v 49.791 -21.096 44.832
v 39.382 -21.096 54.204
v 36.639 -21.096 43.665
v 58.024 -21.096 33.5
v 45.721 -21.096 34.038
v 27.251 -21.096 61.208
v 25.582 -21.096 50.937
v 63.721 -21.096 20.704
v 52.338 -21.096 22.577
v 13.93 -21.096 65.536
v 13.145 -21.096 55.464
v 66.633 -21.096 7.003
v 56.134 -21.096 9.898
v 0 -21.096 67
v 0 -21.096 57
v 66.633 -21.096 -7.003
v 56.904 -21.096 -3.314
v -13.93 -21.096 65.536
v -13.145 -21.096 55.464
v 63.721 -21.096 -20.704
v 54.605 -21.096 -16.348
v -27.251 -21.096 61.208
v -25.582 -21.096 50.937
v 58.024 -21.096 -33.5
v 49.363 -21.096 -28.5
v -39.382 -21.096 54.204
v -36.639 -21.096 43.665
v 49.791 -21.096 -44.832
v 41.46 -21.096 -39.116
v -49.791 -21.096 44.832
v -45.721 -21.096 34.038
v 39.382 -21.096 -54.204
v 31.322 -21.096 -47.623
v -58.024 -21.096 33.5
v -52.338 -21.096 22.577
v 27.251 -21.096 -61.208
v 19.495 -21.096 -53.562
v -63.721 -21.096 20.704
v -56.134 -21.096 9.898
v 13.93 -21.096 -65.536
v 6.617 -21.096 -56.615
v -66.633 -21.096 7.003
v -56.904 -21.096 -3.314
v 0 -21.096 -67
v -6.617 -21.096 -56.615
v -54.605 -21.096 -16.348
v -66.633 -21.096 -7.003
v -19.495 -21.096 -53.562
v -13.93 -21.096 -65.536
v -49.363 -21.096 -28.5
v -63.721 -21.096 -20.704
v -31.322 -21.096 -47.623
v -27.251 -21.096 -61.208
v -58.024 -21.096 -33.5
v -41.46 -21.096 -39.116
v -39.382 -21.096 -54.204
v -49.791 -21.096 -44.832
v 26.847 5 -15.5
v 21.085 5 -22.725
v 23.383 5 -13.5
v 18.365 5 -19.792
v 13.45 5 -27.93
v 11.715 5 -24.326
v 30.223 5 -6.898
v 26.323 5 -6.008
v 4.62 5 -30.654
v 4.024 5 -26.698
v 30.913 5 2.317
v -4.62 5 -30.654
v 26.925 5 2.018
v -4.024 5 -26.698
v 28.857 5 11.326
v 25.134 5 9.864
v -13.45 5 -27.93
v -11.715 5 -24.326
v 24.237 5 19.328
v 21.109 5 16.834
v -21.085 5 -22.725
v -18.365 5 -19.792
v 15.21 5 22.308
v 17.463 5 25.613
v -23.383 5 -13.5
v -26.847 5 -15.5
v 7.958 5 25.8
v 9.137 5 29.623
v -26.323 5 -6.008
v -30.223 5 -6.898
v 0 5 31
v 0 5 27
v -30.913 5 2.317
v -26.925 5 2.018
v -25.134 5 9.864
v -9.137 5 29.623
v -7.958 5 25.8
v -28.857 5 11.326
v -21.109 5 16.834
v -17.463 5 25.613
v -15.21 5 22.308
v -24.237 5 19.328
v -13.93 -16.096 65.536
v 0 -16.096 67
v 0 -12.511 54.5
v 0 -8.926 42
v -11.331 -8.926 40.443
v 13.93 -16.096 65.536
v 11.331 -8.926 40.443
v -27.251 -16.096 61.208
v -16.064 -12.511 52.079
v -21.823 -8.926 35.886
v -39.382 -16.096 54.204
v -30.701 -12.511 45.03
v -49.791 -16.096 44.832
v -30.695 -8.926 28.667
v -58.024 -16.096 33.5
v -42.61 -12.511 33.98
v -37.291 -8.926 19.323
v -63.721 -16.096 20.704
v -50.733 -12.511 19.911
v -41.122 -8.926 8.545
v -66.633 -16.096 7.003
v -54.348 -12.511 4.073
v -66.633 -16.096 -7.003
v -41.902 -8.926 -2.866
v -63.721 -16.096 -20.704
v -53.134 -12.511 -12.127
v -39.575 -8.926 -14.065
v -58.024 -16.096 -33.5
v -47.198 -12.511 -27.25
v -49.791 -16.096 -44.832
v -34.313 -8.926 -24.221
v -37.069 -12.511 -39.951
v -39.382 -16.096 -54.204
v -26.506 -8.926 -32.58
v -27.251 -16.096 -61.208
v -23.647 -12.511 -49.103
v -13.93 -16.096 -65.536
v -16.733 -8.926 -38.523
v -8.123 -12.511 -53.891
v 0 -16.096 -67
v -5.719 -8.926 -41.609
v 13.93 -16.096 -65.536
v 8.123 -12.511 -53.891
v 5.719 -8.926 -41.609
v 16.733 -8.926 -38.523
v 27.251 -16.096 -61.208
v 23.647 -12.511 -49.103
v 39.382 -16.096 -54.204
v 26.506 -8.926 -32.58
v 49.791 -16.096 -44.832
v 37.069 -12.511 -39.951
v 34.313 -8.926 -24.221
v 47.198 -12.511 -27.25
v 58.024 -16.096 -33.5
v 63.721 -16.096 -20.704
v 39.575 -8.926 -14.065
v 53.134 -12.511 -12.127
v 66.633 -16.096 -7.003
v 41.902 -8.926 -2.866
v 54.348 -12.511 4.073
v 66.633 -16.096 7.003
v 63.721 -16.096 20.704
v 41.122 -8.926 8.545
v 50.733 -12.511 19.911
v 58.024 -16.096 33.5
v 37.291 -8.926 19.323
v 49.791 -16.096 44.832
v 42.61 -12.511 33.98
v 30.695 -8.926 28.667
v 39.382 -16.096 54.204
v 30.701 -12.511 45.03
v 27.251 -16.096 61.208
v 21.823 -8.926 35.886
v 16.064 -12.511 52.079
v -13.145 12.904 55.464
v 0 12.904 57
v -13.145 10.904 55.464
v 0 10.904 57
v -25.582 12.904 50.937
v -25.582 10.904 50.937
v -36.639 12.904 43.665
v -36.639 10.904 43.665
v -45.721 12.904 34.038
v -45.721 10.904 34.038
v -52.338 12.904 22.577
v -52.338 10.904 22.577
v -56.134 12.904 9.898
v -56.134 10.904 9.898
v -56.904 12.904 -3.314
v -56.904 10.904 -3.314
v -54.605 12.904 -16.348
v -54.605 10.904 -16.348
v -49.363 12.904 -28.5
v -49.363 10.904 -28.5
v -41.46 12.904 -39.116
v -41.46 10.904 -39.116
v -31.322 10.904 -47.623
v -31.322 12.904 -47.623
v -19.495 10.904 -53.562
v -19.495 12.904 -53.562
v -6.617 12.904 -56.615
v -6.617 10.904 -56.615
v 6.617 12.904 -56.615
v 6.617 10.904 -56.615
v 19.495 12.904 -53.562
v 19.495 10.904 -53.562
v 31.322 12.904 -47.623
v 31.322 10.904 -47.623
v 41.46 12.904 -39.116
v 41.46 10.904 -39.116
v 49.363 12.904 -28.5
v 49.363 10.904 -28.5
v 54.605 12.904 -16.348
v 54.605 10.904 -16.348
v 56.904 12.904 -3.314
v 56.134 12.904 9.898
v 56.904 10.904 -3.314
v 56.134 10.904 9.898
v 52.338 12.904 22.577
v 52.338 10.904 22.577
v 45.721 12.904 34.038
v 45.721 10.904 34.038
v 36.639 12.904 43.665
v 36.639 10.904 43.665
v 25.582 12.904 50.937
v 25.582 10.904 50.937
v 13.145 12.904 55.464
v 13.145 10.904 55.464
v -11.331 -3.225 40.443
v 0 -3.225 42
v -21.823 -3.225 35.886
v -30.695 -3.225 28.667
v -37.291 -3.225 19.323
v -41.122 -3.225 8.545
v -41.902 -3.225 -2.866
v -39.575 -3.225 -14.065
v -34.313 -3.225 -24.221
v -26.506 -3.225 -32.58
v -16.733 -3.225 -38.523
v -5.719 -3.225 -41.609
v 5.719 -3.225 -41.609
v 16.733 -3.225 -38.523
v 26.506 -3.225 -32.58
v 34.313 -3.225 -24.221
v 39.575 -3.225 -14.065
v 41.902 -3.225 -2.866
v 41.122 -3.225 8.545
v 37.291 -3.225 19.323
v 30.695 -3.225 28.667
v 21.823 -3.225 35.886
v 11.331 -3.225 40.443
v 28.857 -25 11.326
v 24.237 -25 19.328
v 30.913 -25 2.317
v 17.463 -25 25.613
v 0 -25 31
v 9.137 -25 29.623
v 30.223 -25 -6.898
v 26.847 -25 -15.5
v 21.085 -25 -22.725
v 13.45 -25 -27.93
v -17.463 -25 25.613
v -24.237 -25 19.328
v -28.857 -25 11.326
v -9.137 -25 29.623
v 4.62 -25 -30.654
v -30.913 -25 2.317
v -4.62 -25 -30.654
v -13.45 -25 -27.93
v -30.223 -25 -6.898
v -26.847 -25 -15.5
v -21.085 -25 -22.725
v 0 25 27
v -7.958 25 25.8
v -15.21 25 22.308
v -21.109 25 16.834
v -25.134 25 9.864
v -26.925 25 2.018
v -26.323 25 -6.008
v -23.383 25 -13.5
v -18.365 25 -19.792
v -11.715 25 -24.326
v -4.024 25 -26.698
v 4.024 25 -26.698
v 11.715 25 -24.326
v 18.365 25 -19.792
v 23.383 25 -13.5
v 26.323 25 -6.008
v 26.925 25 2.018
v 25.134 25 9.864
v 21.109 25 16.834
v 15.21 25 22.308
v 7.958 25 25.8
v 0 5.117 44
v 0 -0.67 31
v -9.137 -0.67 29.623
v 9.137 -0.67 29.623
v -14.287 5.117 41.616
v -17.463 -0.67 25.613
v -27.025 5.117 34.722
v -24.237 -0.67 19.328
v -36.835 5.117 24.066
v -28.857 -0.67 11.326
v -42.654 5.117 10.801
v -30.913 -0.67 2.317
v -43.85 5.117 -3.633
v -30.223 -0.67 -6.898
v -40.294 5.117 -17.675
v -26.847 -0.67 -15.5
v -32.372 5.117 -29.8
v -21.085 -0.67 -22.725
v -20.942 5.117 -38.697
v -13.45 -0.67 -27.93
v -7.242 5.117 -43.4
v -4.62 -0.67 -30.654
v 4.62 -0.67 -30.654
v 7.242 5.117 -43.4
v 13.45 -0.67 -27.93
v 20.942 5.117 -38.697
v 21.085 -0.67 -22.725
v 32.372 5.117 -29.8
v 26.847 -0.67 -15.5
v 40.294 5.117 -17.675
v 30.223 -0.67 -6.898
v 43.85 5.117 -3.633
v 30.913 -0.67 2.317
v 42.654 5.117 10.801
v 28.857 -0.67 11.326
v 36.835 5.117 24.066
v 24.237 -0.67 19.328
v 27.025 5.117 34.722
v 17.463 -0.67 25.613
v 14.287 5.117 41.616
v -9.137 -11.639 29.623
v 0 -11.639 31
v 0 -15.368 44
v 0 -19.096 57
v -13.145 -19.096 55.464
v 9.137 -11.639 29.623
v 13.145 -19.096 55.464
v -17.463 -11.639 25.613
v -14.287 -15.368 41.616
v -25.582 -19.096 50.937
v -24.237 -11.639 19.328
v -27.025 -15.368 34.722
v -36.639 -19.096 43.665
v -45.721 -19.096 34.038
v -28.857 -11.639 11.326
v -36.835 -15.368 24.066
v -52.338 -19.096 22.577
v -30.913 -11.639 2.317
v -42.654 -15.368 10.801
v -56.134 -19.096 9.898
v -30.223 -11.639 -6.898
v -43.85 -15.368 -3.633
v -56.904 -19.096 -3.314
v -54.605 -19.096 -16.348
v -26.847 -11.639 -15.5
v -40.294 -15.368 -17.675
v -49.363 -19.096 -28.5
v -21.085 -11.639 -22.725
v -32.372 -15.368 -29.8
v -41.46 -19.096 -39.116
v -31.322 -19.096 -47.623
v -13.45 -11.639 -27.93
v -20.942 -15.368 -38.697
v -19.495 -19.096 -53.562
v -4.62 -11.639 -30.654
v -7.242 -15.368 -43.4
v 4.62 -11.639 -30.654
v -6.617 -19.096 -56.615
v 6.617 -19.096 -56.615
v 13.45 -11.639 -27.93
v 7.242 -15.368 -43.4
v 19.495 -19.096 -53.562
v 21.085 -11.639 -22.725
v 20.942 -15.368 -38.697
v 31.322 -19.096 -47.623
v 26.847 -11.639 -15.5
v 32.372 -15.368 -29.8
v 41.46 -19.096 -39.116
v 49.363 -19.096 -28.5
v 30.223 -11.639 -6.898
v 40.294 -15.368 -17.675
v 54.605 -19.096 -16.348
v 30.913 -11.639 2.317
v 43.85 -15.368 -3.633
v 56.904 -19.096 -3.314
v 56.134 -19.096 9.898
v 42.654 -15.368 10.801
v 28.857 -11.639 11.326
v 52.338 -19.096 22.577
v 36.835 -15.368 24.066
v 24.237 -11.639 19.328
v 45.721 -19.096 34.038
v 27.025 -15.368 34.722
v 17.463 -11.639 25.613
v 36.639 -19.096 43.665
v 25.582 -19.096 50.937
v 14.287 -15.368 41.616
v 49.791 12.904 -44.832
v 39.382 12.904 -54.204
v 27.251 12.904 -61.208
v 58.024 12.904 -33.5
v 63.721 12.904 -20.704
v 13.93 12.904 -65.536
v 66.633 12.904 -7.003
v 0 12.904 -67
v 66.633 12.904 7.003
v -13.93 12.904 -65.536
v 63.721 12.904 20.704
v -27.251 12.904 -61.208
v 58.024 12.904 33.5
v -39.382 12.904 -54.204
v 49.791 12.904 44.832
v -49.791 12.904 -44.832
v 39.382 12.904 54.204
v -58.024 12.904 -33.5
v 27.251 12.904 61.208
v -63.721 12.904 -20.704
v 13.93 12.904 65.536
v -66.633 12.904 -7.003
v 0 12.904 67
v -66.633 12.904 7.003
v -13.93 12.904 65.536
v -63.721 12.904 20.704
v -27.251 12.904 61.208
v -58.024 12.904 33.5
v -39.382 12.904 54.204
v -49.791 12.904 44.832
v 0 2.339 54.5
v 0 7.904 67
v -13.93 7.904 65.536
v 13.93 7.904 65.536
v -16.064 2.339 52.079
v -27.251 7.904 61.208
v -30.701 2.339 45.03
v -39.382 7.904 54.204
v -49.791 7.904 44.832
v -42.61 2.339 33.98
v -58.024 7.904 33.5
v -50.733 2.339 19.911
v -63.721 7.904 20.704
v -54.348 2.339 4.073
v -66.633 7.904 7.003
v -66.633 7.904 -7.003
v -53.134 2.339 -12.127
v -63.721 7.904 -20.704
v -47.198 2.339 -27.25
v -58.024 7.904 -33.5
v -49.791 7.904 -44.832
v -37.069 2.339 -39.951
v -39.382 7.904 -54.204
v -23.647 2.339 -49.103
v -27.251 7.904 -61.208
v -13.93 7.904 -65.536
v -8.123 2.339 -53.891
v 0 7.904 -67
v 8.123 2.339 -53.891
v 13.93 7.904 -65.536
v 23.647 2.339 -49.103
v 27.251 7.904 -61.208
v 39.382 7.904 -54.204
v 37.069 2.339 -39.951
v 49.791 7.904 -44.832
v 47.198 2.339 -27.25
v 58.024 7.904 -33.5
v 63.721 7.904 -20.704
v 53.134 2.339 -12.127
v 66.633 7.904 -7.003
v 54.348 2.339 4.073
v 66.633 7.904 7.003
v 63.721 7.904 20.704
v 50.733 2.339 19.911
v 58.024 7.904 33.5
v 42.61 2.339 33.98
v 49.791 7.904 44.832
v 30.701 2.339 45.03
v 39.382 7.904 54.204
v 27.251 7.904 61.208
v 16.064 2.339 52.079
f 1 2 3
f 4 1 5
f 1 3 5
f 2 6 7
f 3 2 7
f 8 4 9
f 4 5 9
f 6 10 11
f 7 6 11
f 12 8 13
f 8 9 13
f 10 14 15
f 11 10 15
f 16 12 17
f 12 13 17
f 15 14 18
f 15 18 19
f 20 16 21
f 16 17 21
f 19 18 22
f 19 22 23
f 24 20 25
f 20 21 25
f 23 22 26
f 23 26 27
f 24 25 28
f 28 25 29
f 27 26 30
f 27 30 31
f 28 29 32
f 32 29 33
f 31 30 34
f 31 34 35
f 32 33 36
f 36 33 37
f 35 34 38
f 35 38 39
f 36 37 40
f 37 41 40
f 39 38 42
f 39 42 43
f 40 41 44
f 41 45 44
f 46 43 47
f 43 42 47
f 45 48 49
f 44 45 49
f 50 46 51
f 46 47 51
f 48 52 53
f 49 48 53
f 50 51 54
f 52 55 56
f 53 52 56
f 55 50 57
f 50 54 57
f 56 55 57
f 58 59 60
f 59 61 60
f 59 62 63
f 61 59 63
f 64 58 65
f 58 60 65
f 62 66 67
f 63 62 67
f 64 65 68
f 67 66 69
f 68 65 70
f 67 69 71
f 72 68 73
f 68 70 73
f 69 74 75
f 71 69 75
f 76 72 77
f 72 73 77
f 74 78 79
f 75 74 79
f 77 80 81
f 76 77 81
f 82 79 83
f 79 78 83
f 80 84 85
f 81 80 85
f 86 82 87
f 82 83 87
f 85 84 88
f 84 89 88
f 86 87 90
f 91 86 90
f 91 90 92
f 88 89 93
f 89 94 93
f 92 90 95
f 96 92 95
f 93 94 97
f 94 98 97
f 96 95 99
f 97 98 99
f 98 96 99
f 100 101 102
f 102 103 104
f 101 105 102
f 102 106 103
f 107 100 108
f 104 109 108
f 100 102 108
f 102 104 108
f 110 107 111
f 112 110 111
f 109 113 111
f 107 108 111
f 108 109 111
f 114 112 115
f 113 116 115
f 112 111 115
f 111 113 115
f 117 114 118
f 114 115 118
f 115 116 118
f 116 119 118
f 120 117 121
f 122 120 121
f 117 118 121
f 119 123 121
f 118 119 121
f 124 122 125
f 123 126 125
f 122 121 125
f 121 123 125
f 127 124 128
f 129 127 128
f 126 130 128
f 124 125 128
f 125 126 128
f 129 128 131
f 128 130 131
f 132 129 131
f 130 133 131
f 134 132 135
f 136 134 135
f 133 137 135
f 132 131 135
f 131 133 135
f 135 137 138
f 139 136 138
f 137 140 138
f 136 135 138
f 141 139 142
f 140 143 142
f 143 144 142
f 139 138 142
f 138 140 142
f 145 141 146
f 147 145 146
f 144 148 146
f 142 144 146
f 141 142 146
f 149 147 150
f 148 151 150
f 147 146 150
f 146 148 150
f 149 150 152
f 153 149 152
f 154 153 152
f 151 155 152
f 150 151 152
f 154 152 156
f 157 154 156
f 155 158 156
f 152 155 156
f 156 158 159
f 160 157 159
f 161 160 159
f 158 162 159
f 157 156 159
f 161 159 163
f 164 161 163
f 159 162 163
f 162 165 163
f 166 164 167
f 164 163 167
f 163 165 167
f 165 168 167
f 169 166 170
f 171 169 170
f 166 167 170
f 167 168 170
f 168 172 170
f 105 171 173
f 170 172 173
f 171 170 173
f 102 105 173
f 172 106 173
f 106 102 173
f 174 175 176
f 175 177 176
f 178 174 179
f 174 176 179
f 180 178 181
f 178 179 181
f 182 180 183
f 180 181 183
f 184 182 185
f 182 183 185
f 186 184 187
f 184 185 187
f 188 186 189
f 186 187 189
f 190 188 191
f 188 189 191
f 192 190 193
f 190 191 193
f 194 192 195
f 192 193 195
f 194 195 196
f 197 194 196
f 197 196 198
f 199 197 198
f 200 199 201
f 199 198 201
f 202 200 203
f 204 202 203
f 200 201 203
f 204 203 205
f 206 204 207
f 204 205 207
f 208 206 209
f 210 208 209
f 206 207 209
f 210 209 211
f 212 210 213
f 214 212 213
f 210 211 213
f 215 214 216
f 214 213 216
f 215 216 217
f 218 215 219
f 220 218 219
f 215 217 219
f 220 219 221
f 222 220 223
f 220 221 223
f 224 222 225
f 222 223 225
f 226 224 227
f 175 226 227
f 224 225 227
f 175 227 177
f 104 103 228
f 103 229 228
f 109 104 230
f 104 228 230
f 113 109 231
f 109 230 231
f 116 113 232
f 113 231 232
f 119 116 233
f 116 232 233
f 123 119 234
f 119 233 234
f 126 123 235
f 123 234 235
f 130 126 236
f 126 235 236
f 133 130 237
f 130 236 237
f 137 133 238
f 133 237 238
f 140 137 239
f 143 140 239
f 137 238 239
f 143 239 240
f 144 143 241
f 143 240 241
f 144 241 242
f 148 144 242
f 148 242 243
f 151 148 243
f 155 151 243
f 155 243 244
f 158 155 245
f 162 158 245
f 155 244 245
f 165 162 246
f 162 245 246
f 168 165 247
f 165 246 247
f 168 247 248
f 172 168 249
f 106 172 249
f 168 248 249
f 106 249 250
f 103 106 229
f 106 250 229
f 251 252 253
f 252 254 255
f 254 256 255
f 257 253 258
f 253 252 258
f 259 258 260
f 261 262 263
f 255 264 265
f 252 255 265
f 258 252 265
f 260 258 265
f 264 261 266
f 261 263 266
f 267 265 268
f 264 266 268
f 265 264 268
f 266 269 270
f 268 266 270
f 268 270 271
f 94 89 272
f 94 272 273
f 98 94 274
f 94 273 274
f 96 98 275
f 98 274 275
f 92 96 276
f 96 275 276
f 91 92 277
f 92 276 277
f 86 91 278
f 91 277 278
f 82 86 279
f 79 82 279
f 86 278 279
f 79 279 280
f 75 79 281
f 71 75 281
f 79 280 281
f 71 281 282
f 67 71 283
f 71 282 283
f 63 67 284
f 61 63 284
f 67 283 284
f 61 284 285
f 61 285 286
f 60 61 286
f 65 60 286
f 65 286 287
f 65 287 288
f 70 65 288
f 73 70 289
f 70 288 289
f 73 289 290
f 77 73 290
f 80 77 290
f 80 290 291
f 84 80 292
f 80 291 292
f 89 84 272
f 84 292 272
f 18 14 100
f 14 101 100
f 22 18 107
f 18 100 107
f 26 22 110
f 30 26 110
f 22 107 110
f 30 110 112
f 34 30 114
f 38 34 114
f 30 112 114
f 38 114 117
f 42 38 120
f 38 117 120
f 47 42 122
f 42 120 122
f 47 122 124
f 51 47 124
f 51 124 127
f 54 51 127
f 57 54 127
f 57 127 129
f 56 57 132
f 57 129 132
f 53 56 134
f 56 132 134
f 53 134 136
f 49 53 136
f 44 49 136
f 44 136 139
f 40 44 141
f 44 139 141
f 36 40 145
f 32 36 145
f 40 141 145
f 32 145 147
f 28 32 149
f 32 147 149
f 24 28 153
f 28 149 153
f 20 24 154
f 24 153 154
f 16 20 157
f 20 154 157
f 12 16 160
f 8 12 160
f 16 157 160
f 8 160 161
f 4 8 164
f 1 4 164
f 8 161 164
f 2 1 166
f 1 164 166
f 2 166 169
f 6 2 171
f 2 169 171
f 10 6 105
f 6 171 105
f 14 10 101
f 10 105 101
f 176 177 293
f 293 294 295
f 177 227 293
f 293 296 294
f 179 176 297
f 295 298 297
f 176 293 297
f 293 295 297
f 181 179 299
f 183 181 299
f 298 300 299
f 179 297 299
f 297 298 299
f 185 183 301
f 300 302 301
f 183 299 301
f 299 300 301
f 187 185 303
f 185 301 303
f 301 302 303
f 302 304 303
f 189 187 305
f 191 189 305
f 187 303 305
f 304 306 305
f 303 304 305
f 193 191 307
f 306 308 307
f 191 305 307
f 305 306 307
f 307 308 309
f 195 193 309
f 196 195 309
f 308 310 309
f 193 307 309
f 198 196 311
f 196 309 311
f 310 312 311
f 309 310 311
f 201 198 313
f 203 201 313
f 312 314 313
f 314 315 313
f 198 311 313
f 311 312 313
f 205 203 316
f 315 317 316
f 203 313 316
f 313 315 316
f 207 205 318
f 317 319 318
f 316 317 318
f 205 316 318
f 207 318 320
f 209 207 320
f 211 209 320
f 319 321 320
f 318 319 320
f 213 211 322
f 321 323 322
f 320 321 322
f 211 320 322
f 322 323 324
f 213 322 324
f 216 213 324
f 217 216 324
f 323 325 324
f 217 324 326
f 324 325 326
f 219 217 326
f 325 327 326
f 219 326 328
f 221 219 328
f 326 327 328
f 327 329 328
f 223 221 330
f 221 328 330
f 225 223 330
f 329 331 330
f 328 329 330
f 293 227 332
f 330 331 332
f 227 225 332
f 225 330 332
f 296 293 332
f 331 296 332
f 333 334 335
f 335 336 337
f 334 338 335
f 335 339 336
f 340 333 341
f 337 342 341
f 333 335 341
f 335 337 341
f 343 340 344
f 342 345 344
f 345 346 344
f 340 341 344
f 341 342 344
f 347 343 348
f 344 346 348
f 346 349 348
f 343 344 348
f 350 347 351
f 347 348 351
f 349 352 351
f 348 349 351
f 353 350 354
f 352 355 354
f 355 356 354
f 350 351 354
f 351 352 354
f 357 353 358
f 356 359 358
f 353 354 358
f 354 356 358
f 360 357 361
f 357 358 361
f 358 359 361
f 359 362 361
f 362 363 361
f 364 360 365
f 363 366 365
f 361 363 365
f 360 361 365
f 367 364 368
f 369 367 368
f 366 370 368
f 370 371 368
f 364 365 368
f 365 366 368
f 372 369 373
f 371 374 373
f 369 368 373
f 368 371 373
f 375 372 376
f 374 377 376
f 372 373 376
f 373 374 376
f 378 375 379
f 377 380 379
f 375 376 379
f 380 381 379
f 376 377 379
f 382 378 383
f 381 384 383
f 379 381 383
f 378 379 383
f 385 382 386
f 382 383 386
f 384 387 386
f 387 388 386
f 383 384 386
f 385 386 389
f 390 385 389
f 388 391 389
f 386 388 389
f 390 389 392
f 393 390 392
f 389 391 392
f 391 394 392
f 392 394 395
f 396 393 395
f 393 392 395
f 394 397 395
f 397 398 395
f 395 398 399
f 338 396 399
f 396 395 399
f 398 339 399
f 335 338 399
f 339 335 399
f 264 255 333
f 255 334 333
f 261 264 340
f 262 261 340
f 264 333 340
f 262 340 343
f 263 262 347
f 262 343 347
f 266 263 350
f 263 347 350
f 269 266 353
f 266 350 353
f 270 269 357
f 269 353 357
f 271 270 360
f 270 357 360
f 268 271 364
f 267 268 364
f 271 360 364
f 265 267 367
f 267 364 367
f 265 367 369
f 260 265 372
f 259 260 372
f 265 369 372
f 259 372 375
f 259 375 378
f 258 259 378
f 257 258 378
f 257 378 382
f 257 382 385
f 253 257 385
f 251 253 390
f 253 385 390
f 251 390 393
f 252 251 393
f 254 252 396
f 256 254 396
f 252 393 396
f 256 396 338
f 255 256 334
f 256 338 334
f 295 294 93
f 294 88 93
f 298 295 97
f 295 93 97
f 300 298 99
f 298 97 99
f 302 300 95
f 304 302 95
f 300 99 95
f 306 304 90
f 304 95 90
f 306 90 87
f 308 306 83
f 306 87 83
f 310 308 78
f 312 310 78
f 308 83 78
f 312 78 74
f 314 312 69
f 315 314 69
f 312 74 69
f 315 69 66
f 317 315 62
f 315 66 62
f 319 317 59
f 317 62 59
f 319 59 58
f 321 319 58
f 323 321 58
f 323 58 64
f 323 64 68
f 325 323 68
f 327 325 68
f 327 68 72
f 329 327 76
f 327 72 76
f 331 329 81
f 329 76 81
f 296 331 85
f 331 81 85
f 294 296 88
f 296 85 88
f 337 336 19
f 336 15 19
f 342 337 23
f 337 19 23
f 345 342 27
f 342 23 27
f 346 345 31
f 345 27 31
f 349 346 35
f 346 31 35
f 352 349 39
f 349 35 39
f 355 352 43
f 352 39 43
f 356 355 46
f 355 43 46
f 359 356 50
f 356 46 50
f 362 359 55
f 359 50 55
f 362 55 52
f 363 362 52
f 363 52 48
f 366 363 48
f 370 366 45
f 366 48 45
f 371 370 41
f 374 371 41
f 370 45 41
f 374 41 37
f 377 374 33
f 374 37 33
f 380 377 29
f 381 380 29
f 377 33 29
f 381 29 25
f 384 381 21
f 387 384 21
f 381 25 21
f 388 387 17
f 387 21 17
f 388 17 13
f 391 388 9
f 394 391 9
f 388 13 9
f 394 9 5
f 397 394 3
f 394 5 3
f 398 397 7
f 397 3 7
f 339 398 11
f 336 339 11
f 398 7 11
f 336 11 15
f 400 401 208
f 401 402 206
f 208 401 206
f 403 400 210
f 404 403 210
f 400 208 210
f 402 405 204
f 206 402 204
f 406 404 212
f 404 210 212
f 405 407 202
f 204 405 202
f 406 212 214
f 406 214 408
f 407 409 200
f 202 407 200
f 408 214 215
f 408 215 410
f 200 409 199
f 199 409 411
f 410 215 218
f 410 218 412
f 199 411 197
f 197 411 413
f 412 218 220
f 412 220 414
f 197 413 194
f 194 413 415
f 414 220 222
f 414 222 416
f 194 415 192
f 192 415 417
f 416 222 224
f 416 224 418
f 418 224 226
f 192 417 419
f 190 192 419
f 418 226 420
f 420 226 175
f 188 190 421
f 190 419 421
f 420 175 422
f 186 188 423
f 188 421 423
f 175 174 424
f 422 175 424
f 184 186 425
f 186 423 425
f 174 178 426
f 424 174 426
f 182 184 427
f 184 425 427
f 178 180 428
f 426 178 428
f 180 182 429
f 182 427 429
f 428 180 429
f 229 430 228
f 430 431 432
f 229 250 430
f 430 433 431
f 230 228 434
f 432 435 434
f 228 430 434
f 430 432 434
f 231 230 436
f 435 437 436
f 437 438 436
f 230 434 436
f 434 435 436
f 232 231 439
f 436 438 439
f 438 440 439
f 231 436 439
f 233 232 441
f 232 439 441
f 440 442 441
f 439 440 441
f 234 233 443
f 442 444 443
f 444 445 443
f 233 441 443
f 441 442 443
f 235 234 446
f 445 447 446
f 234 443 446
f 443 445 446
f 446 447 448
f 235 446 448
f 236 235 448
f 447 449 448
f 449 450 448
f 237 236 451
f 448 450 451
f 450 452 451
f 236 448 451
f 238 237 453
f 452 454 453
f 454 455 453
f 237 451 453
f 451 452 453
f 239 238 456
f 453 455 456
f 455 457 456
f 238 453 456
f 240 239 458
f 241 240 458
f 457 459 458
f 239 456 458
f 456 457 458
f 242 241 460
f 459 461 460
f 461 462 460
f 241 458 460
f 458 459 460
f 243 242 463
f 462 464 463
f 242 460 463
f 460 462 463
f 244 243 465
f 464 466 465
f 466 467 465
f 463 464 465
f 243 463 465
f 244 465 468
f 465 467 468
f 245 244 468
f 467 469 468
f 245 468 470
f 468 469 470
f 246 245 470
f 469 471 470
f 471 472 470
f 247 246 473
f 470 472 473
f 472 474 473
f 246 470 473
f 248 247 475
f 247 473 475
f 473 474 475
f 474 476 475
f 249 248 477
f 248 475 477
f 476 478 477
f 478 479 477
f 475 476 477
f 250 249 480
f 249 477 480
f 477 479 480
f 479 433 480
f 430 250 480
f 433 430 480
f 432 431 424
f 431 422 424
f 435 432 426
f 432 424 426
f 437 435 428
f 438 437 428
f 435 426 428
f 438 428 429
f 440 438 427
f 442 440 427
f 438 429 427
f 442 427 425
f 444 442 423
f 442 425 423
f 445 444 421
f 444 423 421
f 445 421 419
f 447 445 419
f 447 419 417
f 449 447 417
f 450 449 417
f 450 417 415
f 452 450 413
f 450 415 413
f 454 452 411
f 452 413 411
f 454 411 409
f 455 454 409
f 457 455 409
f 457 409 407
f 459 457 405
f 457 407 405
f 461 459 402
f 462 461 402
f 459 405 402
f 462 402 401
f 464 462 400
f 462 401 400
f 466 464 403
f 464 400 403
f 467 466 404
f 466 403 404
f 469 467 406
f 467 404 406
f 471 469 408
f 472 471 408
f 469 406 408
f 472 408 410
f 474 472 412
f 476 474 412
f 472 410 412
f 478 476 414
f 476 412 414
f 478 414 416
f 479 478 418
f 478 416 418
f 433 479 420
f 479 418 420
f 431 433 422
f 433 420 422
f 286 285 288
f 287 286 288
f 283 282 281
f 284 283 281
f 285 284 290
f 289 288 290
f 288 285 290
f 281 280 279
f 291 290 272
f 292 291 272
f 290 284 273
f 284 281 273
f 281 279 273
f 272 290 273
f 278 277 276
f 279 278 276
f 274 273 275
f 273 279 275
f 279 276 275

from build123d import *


with BuildPart() as part:
    # Sketch4 → Revolve1 (revolve)
    with BuildSketch(Plane(origin=(0, 0, 0), x_dir=(0, 0, -1), z_dir=(1, 0, 0))):
        Polygon((0, 25), (0, -25), (-31, -25), (-31, -11.639049179), (-57, -19.096481272), (-57, -21.096481272), (-67, -21.096481272), (-67, -16.096481272), (-42, -8.92587349), (-42, -3.225013879), (-67, 7.903518728), (-67, 12.903518728), (-57, 12.903518728), (-57, 10.903518728), (-31, -0.670155183), (-31, 5), (-27, 5), (-27, 25), align=None)
    revolve(axis=Axis((0, 25, 0), (0, -1, 0)))


solid = part.part
